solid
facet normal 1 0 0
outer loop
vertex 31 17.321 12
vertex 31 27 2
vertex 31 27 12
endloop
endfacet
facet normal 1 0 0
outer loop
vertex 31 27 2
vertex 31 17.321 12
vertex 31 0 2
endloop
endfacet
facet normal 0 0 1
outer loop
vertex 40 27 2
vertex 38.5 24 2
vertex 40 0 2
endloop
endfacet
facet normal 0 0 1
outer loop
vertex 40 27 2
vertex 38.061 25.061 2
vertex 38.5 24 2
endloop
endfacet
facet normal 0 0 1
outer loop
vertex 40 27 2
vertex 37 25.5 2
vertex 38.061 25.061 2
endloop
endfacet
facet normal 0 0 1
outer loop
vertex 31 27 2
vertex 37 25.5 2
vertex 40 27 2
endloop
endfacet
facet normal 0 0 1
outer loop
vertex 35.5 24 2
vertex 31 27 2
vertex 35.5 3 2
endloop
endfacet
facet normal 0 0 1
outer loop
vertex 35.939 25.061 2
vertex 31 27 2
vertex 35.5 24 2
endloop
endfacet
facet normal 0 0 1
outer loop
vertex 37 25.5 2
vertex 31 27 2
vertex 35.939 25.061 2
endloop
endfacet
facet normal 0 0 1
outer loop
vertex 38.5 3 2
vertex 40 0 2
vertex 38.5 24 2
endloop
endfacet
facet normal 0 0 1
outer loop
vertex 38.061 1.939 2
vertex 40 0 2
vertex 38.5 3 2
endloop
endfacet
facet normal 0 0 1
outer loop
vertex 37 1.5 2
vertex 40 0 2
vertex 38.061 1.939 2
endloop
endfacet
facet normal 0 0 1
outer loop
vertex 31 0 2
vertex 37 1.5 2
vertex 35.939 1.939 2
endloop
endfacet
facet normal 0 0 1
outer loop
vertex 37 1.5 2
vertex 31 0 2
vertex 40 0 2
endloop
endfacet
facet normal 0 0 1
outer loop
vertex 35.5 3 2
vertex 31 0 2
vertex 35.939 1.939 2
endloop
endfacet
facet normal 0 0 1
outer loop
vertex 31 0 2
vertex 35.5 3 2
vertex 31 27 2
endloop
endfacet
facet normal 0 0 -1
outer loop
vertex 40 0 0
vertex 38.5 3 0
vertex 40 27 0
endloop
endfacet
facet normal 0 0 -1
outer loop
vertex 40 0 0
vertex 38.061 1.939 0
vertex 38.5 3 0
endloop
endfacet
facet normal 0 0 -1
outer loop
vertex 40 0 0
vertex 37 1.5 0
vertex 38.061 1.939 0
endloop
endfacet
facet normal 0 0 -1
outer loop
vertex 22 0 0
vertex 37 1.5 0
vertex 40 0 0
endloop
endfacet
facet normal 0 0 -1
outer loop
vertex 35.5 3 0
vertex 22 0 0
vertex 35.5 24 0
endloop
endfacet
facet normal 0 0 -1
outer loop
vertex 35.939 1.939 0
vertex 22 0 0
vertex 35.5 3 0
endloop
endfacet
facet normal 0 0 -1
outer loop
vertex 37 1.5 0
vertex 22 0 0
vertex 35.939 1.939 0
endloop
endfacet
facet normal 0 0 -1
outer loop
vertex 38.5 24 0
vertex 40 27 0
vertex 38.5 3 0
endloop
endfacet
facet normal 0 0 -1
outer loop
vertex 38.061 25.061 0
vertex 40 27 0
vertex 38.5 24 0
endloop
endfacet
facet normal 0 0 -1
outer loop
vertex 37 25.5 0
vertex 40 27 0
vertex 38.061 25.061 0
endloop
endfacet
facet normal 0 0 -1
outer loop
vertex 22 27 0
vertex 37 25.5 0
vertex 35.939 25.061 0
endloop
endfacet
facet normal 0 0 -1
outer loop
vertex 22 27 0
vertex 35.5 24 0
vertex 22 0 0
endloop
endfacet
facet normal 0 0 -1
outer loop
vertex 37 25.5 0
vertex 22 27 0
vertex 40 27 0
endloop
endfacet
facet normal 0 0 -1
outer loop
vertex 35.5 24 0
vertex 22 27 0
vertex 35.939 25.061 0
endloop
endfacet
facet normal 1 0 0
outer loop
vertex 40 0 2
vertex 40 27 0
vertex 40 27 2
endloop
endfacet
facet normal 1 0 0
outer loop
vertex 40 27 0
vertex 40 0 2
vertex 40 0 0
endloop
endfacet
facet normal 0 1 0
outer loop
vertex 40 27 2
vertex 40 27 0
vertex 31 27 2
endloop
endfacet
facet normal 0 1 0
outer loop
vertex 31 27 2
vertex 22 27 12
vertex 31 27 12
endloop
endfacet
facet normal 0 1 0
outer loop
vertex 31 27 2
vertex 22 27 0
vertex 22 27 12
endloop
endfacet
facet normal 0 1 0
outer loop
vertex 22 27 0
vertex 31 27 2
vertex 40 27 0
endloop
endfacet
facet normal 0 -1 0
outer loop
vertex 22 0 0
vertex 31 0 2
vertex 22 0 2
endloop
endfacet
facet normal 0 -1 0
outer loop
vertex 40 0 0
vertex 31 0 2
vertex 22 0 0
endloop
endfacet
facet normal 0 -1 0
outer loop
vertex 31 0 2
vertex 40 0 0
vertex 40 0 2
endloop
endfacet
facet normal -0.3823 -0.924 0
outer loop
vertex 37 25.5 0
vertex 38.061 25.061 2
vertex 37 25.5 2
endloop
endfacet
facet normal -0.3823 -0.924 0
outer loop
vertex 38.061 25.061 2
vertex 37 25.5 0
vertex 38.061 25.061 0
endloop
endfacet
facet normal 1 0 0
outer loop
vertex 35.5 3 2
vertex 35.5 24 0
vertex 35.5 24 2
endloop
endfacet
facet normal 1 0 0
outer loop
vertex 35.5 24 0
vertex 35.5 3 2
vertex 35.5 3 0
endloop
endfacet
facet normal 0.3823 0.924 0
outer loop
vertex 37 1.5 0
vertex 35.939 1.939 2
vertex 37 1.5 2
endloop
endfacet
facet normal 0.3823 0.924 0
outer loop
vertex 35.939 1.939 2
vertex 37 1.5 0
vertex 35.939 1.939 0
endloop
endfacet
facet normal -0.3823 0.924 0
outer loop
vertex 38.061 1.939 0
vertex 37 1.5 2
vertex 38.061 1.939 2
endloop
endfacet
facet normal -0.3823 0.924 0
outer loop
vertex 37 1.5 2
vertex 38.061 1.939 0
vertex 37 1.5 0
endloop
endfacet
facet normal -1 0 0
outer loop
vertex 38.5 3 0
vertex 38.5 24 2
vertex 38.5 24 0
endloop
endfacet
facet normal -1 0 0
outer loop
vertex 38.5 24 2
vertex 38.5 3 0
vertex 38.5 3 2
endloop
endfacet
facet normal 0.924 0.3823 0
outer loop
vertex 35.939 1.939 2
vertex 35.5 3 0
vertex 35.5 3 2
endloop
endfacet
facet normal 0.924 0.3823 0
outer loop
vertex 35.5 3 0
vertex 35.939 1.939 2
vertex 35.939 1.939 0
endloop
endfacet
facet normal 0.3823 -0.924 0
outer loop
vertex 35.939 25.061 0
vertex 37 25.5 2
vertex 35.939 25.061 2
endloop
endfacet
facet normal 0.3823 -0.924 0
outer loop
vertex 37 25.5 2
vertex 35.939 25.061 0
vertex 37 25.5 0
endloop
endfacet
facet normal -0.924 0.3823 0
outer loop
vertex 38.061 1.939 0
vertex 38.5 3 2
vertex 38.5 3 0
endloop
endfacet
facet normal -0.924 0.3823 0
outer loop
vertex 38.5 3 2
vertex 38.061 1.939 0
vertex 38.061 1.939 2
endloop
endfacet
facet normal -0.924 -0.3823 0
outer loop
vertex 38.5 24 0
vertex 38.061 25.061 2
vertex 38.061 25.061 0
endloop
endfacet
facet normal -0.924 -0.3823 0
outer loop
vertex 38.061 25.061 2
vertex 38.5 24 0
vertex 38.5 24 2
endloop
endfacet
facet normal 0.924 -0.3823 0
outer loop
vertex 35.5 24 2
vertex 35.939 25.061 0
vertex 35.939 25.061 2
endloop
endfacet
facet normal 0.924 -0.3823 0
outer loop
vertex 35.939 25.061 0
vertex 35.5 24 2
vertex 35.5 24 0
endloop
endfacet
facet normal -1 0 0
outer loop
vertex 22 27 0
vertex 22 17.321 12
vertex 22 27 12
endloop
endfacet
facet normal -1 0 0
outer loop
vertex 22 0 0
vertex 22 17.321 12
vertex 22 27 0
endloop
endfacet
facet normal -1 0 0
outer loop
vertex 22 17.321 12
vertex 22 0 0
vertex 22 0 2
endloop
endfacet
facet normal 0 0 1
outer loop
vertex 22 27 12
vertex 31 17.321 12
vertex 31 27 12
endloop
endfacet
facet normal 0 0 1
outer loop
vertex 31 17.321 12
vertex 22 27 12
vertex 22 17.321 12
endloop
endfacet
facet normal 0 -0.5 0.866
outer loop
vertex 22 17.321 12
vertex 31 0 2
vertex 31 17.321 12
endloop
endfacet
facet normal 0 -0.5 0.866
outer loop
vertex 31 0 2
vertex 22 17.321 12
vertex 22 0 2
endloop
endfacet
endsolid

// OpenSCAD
holes = 3;
hole_d = 3;
spacing = 4.2;
thickness = 2;

ff = 0.1;

module body() {
  difference() {
    cube([hole_d*2, (holes)*(hole_d*1.75), thickness]);
    translate([hole_d, hole_d, -ff]) {
      for(a=[0:holes-1]) {
        translate([0, a*spacing,0]) cylinder(d=hole_d, h=thickness+(ff*2), $fn=8);
      }
    }
  }
}

module bolt_holder() {
  difference() {
    union() {
      cylinder(d=6, h=thickness);
      translate([-3,0,0]) cube([6,6,thickness]);
    }
    translate([0,0,-ff]) cylinder(d=3.25, h=thickness+(ff*2), $fn=8);
  }
}

module simple_support() {
  body();
  translate([hole_d,-hole_d-3,0]) bolt_holder();
}

// simple_support();

module simple_slider() {
  difference() {
    cube([hole_d*3, (holes)*(hole_d*3), thickness]);
    hull() {
      translate([hole_d, hole_d, -ff]) {
        for(a=[0:holes-1]) {
          translate([0, a*spacing*2.5,0]) cylinder(d=hole_d, h=thickness+(ff*2), $fn=8);
        }
      }
    }
  }
  translate([hole_d*3, 0, 0]) {
    difference() {
      cube([hole_d*3, (holes)*(hole_d*3), 12]);
      translate([-ff, 0, thickness]) rotate([30,0,0]) cube([hole_d*3+(ff*2), (holes)*(hole_d*2)*2, 10]);
	  //translate([-ff, 20, 12]) rotate([-55,0,0]) cube([hole_d*3+(ff*2), (holes)*(hole_d*2)*2, 10]);
	  //translate([-ff, 5, 11]) rotate([-5,0,0]) cube([hole_d*3+(ff*2), (holes)*(hole_d*2)*2, 10]);	
    }


  }

}

//simple_slider();
translate([40,0,0]) mirror([1,0,0]) simple_slider();
